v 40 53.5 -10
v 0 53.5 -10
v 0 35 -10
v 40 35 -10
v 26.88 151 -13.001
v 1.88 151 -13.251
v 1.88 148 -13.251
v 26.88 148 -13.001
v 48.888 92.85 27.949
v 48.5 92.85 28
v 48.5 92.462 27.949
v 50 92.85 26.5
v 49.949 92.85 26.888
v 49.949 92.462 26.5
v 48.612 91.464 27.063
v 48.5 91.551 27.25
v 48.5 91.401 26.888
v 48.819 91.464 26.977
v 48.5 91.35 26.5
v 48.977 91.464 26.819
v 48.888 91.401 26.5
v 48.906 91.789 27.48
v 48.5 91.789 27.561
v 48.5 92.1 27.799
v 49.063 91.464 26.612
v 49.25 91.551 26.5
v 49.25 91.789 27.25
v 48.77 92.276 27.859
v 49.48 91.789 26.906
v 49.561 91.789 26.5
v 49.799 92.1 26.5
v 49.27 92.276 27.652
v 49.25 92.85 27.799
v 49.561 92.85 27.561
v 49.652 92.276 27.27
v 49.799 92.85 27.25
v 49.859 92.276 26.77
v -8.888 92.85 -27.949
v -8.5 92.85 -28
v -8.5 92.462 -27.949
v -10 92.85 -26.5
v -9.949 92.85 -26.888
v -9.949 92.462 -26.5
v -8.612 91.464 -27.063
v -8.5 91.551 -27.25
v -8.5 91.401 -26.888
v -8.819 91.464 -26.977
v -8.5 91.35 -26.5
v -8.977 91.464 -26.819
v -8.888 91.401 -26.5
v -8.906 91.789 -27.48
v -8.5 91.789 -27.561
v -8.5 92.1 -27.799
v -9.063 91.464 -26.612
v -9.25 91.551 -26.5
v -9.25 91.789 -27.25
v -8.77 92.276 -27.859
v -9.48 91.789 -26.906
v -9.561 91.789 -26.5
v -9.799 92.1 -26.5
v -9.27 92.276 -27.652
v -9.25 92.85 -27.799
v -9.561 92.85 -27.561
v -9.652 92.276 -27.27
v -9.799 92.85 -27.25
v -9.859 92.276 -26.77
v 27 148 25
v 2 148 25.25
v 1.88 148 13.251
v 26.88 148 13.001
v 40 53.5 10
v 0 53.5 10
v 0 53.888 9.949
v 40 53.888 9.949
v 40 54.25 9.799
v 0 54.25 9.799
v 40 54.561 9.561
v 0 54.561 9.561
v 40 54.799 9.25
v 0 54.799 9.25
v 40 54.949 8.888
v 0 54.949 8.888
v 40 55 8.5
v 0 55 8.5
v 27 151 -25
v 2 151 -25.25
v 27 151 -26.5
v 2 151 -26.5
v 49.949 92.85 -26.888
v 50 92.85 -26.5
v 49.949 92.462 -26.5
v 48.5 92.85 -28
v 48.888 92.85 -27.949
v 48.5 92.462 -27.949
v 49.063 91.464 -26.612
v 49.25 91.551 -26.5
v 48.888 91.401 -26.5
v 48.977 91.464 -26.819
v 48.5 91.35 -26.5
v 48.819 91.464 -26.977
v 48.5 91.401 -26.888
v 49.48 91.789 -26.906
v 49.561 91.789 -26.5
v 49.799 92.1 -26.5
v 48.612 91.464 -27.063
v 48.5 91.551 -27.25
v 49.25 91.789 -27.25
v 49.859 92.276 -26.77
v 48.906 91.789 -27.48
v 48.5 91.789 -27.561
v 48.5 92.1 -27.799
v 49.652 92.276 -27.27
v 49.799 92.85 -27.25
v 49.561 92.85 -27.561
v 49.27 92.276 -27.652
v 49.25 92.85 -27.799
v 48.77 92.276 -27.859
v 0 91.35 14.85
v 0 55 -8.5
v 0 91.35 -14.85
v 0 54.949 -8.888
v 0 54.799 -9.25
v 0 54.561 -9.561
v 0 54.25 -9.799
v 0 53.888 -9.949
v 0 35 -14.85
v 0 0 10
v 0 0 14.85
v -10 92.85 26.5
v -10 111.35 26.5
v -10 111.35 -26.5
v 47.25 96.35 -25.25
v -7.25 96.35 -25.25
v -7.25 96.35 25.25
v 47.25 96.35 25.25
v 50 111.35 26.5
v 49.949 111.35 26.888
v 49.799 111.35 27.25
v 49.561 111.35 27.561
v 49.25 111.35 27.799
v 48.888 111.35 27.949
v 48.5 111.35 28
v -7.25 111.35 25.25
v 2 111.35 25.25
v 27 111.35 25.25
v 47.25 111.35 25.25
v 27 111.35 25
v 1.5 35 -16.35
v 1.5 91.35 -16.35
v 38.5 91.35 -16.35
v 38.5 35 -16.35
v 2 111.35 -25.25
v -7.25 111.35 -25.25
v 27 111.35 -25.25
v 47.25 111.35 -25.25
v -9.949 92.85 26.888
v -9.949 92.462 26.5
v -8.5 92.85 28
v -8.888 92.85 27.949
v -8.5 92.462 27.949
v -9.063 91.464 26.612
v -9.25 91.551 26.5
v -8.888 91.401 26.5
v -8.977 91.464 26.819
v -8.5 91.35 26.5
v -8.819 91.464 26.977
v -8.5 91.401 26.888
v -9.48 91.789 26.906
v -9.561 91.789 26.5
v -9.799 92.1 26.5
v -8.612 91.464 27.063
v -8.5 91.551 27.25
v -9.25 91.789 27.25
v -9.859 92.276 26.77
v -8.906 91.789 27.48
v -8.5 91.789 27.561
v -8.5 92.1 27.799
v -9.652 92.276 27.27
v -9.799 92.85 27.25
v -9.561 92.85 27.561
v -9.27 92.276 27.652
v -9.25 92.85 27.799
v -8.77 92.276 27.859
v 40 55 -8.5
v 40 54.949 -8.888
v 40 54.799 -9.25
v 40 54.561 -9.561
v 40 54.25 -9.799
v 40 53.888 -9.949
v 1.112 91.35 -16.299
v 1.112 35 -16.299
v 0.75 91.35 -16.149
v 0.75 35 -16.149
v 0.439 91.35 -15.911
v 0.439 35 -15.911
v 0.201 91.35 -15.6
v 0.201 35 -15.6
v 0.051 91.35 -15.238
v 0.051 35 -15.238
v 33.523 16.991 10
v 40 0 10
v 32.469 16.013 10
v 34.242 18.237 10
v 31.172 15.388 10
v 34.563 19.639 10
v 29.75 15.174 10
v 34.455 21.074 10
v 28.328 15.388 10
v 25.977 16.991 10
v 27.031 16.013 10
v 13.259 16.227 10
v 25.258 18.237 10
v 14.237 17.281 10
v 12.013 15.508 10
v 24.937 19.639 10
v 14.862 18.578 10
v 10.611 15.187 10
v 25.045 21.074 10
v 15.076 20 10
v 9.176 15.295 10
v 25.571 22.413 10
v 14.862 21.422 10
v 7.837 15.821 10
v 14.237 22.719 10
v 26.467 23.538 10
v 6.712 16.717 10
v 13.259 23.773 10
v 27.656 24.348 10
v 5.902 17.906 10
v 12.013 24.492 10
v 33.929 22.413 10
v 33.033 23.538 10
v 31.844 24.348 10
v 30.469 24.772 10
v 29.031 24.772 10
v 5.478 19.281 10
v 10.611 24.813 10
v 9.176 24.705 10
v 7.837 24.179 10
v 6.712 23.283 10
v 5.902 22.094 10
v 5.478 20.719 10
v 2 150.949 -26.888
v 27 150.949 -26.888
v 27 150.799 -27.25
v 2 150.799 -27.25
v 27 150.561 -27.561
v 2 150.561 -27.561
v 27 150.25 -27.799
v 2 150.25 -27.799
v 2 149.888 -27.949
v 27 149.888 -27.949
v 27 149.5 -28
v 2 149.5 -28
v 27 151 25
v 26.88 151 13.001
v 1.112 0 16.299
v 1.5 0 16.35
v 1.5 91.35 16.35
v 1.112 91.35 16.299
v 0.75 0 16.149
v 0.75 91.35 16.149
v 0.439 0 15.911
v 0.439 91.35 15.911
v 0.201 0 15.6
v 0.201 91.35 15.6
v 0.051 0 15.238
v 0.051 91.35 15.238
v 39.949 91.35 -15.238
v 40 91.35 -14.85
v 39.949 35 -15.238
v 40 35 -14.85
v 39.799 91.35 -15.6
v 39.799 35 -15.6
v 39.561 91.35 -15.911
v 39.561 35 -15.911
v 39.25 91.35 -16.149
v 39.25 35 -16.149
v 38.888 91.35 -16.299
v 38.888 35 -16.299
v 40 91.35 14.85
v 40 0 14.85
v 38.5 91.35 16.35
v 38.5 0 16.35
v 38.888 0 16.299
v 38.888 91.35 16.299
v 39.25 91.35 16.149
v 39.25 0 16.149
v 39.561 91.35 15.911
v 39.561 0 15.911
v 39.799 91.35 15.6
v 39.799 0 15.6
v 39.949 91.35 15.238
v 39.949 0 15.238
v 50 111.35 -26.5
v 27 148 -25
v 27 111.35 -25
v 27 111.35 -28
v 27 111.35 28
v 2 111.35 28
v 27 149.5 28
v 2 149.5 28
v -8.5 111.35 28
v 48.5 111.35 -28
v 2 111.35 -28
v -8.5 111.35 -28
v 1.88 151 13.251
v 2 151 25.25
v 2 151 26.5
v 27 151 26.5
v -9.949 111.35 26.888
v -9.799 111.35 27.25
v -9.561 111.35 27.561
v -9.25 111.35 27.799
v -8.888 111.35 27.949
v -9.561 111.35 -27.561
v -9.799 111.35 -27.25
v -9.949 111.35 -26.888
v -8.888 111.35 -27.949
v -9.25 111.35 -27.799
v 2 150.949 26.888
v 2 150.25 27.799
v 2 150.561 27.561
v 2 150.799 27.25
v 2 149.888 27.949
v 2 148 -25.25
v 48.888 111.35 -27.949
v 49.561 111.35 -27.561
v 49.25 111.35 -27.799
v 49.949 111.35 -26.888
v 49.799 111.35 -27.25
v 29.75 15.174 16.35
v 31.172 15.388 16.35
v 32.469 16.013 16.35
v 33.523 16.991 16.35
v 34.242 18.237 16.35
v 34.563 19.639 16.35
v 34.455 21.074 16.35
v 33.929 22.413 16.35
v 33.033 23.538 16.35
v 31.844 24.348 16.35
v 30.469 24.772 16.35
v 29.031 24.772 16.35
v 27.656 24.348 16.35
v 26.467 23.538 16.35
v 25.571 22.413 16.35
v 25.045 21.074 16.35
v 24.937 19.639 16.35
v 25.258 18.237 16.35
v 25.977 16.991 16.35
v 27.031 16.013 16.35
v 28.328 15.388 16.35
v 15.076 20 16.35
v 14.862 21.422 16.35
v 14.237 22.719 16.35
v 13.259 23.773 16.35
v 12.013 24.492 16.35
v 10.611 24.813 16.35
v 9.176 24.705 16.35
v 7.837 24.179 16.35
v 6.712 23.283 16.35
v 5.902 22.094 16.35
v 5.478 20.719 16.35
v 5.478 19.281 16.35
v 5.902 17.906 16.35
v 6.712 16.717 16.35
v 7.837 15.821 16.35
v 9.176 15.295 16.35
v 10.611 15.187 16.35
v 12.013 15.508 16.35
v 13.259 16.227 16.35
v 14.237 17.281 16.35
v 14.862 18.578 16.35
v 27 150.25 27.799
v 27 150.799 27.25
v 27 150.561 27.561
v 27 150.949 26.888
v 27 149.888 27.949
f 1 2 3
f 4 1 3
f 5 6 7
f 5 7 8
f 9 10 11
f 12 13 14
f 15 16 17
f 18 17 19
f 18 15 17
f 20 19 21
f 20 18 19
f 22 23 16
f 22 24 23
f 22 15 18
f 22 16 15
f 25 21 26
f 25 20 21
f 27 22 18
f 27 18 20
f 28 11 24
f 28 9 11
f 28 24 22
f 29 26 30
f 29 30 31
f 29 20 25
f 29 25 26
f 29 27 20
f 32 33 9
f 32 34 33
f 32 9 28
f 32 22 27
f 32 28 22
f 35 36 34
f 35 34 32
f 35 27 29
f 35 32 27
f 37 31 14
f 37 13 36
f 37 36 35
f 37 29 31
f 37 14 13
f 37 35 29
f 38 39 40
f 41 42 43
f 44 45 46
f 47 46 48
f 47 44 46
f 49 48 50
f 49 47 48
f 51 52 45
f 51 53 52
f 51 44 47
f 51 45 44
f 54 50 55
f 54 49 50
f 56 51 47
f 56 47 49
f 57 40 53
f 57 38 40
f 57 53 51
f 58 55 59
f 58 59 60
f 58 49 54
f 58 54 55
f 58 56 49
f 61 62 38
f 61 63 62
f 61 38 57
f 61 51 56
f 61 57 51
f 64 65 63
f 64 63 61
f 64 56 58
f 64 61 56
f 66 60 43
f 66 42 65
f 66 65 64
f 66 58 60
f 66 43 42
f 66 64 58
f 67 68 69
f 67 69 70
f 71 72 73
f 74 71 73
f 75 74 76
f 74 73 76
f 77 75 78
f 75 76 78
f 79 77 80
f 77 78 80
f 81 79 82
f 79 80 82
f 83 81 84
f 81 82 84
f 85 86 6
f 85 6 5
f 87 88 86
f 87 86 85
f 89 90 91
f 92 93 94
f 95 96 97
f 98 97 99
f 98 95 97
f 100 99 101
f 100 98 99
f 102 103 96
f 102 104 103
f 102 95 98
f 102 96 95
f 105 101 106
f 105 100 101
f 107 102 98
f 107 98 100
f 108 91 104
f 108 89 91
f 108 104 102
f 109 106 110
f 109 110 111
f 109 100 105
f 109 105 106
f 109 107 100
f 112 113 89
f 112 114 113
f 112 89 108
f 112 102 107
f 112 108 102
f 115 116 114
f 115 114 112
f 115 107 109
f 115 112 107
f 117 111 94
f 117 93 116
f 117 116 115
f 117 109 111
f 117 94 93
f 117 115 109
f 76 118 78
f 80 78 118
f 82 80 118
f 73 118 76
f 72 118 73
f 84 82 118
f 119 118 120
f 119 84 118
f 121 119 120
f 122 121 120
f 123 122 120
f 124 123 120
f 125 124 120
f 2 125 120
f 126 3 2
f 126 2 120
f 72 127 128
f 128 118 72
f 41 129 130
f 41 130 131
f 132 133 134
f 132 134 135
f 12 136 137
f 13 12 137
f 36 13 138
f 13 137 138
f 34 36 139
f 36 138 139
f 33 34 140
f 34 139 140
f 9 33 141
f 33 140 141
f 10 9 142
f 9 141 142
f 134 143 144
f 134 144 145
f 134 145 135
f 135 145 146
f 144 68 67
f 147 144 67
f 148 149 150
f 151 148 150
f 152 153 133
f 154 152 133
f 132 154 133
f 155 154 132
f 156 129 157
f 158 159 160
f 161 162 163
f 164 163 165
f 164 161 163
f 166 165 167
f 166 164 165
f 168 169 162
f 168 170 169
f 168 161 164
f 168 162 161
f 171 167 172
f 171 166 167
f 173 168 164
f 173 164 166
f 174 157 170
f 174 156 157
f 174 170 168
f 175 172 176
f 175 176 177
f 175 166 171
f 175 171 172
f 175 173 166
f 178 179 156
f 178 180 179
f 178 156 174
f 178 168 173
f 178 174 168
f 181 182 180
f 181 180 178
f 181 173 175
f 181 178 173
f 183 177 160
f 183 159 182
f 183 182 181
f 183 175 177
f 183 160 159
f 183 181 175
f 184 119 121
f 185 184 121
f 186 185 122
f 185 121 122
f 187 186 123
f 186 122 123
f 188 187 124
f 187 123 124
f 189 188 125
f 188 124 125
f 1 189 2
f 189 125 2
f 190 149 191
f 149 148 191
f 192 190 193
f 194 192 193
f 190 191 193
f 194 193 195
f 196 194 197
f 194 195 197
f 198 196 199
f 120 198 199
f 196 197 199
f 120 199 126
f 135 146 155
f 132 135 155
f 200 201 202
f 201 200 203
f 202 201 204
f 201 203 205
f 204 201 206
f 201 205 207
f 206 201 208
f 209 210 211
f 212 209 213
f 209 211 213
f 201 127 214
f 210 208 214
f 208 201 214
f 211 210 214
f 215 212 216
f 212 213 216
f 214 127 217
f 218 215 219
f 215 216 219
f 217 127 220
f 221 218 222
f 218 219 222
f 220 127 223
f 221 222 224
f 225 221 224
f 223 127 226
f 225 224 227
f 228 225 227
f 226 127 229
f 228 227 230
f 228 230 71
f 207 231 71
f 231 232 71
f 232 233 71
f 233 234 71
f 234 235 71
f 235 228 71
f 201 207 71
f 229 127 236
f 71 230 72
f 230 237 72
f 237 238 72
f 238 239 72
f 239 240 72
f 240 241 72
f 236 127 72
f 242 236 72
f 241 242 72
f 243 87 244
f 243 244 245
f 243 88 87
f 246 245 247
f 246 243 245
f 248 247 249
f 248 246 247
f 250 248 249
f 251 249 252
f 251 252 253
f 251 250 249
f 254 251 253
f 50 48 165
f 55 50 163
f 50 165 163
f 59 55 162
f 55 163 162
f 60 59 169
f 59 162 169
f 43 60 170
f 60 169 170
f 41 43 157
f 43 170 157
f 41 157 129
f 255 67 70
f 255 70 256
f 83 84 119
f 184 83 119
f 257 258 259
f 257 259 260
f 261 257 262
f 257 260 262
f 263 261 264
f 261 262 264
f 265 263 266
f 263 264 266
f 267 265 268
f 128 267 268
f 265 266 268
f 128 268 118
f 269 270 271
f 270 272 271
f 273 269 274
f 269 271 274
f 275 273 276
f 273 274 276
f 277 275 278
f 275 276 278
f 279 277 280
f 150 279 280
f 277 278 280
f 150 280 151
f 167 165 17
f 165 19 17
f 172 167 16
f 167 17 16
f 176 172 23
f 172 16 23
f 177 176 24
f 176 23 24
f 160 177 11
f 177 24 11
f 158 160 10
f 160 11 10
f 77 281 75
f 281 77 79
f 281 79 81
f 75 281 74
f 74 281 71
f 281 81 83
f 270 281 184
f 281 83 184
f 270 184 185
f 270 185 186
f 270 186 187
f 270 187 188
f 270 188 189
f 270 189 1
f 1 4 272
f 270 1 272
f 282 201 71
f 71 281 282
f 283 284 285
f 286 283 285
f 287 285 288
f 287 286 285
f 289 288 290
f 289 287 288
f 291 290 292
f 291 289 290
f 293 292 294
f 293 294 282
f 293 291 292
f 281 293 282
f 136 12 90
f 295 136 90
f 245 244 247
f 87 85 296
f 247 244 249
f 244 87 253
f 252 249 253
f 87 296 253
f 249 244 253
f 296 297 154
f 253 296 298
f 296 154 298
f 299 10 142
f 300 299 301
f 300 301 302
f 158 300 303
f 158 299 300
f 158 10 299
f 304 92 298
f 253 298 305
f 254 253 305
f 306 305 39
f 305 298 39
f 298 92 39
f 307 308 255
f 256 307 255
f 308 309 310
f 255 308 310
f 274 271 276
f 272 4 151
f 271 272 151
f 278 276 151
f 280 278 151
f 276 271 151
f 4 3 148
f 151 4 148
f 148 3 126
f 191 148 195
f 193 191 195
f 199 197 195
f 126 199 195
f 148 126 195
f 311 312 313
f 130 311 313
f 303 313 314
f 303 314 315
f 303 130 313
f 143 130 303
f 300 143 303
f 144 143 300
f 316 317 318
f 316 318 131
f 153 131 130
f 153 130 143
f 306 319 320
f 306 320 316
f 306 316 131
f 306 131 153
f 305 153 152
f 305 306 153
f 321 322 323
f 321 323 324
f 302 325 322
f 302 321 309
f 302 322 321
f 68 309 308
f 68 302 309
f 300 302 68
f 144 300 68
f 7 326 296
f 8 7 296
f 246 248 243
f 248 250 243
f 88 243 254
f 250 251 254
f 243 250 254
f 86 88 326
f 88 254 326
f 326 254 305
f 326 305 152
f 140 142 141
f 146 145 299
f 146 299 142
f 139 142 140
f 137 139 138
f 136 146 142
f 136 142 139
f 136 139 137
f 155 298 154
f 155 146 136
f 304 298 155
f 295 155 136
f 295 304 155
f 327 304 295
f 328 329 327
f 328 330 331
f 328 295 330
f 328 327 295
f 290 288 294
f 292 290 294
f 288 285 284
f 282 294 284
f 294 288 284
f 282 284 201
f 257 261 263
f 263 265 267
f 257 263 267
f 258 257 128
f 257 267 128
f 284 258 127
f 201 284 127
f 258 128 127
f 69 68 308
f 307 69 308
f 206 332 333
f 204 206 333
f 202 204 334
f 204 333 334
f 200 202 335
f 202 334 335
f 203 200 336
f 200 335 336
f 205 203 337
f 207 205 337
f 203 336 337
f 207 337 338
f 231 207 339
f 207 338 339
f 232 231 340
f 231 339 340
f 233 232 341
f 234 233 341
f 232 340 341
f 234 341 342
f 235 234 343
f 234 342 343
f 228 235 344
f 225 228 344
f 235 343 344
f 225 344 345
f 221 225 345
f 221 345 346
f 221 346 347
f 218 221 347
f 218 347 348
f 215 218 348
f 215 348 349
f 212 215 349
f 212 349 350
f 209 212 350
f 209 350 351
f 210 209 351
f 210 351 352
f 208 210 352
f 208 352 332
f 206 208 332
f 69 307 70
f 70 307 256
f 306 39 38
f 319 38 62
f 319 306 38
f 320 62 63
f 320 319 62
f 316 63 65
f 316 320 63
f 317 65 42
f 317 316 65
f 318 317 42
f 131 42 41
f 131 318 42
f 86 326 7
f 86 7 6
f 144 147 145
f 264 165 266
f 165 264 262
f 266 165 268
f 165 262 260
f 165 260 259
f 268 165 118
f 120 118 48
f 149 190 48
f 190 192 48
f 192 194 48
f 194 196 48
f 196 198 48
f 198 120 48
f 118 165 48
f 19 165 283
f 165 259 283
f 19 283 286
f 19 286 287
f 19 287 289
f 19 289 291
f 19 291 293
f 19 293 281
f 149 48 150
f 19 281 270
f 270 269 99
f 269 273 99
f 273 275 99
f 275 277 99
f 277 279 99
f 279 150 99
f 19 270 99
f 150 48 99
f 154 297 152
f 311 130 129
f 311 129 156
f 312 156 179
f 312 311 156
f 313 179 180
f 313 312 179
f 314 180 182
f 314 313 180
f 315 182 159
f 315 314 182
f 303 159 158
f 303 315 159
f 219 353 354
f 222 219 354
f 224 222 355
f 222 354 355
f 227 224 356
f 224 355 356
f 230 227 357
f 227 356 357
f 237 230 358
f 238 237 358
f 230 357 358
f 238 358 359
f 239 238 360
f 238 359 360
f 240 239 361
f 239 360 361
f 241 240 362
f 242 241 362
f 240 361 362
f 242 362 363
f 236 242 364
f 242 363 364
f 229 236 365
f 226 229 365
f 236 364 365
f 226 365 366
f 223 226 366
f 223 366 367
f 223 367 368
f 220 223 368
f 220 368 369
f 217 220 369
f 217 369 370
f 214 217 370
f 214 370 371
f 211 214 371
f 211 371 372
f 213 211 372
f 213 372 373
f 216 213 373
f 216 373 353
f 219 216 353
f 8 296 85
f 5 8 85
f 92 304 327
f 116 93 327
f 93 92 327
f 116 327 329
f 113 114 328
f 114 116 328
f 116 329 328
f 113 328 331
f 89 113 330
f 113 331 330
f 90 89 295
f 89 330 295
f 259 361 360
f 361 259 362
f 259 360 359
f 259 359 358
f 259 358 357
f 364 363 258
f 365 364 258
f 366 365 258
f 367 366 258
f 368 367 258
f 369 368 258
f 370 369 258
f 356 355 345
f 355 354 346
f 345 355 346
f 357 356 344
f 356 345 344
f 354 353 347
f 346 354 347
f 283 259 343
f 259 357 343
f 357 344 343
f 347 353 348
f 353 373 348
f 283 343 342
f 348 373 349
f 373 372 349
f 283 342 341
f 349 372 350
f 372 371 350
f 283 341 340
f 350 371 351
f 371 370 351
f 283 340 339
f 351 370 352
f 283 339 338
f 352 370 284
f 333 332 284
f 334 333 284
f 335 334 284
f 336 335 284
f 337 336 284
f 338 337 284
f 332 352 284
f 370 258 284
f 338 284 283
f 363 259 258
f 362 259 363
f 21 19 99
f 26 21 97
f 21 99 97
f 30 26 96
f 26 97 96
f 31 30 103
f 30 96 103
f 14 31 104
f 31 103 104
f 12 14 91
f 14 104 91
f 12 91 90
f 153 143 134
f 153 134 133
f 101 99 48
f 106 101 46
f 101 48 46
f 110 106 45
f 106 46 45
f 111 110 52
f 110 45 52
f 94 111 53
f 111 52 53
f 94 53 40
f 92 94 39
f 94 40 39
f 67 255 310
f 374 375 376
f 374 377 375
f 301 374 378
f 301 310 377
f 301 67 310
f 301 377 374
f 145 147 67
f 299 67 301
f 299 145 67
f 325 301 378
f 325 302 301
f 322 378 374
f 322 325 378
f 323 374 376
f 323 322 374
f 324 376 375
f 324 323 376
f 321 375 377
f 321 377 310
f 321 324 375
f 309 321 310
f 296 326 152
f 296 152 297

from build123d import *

# Parameters (mm, degrees)
BOSS_EXTRUDE1_DEPTH = 40
SKETCH2_R           = 4.826
CUT_EXTRUDE2_DEPTH  = 81.20668613
SKETCH6_W           = 40
SKETCH6_H           = 32.7
BOSS_EXTRUDE2_DEPTH = 30
BOSS_EXTRUDE3_START = 91.35
SKETCH7_W           = 60
SKETCH7_H           = 56
BOSS_EXTRUDE3_DEPTH = 20
SKETCH8_W           = 54.5
SKETCH8_H           = 50.5
CUT_EXTRUDE3_DEPTH  = 15
BOSS_EXTRUDE4_DEPTH = 39.65
SKETCH10_W          = 25.001249969
SKETCH10_H          = 3
BOSS_EXTRUDE5_DEPTH = 12
FILLET1_R           = 1.5
FILLET2_R           = 1.5
FILLET3_R           = 1.5


with BuildPart() as part:
    # Sketch1 → Boss-Extrude1 (new body)
    with BuildSketch(Plane(origin=(0, 0, 0), x_dir=(0, 0, -1), z_dir=(1, 0, 0))):
        with BuildLine():
            Line((-10, 0), (-10, 53.5))
            ThreePointArc((-10, 53.5), (-9.560660172, 54.560660172), (-8.5, 55))
            Line((-8.5, 55), (8.5, 55))
            ThreePointArc((8.5, 55), (9.560660172, 54.560660172), (10, 53.5))
            Line((10, 53.5), (10, 35))
            Line((10, 35), (16.35, 35))
            Line((16.35, 35), (16.35, 61.35))
            Line((16.35, 61.35), (-16.35, 61.35))
            Line((-16.35, 61.35), (-16.35, 0))
            Line((-16.35, 0), (-10, 0))
        make_face()
    extrude(amount=BOSS_EXTRUDE1_DEPTH)

    # Sketch2 → Cut-Extrude2 (cut, through all)
    with BuildSketch(Plane.XY.offset(16.35)):
        with Locations((10.25, 20)):
            Circle(SKETCH2_R)
        with Locations(Location((29.75, 20, 0), (0, 0, 270))):
            Circle(SKETCH2_R)
    extrude(amount=-CUT_EXTRUDE2_DEPTH, mode=Mode.SUBTRACT)

    # Sketch6 → Boss-Extrude2 (add)
    with BuildSketch(Plane(origin=(0, 61.35, 0), x_dir=(1, 0, 0), z_dir=(0, 1, 0))):
        with Locations((20, 0)):
            Rectangle(SKETCH6_W, SKETCH6_H)
    extrude(amount=BOSS_EXTRUDE2_DEPTH)

    # Sketch7 → Boss-Extrude3 (add)
    with BuildSketch(Plane(origin=(0, 0, 0), x_dir=(1, 0, 0), z_dir=(0, 1, 0)).offset(BOSS_EXTRUDE3_START)):
        with Locations((20, 0)):
            Rectangle(SKETCH7_W, SKETCH7_H)
    extrude(amount=BOSS_EXTRUDE3_DEPTH)

    # Sketch8 → Cut-Extrude3 (cut)
    with BuildSketch(Plane(origin=(0, 111.35, 0), x_dir=(1, 0, 0), z_dir=(0, 1, 0))):
        with Locations((20, 0)):
            Rectangle(SKETCH8_W, SKETCH8_H)
    extrude(amount=-CUT_EXTRUDE3_DEPTH, mode=Mode.SUBTRACT)

    # Sketch9 → Boss-Extrude4 (add)
    with BuildSketch(Plane(origin=(0, 111.35, 0), x_dir=(1, 0, 0), z_dir=(0, 1, 0))):
        Polygon((2, -25.25), (27, -25), (27, -28), (2, -28), align=None)
    boss_extrude4 = extrude(amount=BOSS_EXTRUDE4_DEPTH)

    # Sketch10 → Boss-Extrude5 (add)
    with BuildSketch(Plane(origin=(3.999900008, 0, 25.230001), x_dir=(0.9999500037496876, 0, -0.00999950003749703), z_dir=(0.00999950003749703, 0, 0.9999500037496877))):
        with Locations((10.500624984, 149.5)):
            Rectangle(SKETCH10_W, SKETCH10_H)
    boss_extrude5 = extrude(amount=-BOSS_EXTRUDE5_DEPTH)

    # Mirror1: Boss-Extrude4, Boss-Extrude5 across plane
    add(boss_extrude4.mirror(Plane.XY))
    add(boss_extrude5.mirror(Plane.XY))

    # Fillet1
    fillet1_edges = [part.edges().sort_by_distance(p)[0] for p in [
        (14.5, 151, -28),
        (14.5, 151, 28),
    ]]
    fillet(fillet1_edges, radius=FILLET1_R)

    # Fillet2
    fillet2_edges = [part.edges().sort_by_distance(p)[0] for p in [
        (0, 45.675, 16.35),
        (0, 63.175, -16.35),
        (40, 63.175, -16.35),
        (40, 45.675, 16.35),
        (50, 101.35, -28),
        (-10, 101.35, -28),
        (-10, 101.35, 28),
        (50, 101.35, 28),
    ]]
    fillet(fillet2_edges, radius=FILLET2_R)

    # Fillet3
    fillet3_edges = [part.edges().sort_by_distance(p)[0] for p in [
        (20, 91.35, 28),
        (20, 91.35, -28),
        (50, 91.35, 0),
        (-10, 91.35, 0),
        (49.560660172, 91.35, 27.560660172),
        (49.560660172, 91.35, -27.560660172),
        (-9.560660172, 91.35, -27.560660172),
        (-9.560660172, 91.35, 27.560660172),
    ]]
    fillet(fillet3_edges, radius=FILLET3_R)


solid = part.part
